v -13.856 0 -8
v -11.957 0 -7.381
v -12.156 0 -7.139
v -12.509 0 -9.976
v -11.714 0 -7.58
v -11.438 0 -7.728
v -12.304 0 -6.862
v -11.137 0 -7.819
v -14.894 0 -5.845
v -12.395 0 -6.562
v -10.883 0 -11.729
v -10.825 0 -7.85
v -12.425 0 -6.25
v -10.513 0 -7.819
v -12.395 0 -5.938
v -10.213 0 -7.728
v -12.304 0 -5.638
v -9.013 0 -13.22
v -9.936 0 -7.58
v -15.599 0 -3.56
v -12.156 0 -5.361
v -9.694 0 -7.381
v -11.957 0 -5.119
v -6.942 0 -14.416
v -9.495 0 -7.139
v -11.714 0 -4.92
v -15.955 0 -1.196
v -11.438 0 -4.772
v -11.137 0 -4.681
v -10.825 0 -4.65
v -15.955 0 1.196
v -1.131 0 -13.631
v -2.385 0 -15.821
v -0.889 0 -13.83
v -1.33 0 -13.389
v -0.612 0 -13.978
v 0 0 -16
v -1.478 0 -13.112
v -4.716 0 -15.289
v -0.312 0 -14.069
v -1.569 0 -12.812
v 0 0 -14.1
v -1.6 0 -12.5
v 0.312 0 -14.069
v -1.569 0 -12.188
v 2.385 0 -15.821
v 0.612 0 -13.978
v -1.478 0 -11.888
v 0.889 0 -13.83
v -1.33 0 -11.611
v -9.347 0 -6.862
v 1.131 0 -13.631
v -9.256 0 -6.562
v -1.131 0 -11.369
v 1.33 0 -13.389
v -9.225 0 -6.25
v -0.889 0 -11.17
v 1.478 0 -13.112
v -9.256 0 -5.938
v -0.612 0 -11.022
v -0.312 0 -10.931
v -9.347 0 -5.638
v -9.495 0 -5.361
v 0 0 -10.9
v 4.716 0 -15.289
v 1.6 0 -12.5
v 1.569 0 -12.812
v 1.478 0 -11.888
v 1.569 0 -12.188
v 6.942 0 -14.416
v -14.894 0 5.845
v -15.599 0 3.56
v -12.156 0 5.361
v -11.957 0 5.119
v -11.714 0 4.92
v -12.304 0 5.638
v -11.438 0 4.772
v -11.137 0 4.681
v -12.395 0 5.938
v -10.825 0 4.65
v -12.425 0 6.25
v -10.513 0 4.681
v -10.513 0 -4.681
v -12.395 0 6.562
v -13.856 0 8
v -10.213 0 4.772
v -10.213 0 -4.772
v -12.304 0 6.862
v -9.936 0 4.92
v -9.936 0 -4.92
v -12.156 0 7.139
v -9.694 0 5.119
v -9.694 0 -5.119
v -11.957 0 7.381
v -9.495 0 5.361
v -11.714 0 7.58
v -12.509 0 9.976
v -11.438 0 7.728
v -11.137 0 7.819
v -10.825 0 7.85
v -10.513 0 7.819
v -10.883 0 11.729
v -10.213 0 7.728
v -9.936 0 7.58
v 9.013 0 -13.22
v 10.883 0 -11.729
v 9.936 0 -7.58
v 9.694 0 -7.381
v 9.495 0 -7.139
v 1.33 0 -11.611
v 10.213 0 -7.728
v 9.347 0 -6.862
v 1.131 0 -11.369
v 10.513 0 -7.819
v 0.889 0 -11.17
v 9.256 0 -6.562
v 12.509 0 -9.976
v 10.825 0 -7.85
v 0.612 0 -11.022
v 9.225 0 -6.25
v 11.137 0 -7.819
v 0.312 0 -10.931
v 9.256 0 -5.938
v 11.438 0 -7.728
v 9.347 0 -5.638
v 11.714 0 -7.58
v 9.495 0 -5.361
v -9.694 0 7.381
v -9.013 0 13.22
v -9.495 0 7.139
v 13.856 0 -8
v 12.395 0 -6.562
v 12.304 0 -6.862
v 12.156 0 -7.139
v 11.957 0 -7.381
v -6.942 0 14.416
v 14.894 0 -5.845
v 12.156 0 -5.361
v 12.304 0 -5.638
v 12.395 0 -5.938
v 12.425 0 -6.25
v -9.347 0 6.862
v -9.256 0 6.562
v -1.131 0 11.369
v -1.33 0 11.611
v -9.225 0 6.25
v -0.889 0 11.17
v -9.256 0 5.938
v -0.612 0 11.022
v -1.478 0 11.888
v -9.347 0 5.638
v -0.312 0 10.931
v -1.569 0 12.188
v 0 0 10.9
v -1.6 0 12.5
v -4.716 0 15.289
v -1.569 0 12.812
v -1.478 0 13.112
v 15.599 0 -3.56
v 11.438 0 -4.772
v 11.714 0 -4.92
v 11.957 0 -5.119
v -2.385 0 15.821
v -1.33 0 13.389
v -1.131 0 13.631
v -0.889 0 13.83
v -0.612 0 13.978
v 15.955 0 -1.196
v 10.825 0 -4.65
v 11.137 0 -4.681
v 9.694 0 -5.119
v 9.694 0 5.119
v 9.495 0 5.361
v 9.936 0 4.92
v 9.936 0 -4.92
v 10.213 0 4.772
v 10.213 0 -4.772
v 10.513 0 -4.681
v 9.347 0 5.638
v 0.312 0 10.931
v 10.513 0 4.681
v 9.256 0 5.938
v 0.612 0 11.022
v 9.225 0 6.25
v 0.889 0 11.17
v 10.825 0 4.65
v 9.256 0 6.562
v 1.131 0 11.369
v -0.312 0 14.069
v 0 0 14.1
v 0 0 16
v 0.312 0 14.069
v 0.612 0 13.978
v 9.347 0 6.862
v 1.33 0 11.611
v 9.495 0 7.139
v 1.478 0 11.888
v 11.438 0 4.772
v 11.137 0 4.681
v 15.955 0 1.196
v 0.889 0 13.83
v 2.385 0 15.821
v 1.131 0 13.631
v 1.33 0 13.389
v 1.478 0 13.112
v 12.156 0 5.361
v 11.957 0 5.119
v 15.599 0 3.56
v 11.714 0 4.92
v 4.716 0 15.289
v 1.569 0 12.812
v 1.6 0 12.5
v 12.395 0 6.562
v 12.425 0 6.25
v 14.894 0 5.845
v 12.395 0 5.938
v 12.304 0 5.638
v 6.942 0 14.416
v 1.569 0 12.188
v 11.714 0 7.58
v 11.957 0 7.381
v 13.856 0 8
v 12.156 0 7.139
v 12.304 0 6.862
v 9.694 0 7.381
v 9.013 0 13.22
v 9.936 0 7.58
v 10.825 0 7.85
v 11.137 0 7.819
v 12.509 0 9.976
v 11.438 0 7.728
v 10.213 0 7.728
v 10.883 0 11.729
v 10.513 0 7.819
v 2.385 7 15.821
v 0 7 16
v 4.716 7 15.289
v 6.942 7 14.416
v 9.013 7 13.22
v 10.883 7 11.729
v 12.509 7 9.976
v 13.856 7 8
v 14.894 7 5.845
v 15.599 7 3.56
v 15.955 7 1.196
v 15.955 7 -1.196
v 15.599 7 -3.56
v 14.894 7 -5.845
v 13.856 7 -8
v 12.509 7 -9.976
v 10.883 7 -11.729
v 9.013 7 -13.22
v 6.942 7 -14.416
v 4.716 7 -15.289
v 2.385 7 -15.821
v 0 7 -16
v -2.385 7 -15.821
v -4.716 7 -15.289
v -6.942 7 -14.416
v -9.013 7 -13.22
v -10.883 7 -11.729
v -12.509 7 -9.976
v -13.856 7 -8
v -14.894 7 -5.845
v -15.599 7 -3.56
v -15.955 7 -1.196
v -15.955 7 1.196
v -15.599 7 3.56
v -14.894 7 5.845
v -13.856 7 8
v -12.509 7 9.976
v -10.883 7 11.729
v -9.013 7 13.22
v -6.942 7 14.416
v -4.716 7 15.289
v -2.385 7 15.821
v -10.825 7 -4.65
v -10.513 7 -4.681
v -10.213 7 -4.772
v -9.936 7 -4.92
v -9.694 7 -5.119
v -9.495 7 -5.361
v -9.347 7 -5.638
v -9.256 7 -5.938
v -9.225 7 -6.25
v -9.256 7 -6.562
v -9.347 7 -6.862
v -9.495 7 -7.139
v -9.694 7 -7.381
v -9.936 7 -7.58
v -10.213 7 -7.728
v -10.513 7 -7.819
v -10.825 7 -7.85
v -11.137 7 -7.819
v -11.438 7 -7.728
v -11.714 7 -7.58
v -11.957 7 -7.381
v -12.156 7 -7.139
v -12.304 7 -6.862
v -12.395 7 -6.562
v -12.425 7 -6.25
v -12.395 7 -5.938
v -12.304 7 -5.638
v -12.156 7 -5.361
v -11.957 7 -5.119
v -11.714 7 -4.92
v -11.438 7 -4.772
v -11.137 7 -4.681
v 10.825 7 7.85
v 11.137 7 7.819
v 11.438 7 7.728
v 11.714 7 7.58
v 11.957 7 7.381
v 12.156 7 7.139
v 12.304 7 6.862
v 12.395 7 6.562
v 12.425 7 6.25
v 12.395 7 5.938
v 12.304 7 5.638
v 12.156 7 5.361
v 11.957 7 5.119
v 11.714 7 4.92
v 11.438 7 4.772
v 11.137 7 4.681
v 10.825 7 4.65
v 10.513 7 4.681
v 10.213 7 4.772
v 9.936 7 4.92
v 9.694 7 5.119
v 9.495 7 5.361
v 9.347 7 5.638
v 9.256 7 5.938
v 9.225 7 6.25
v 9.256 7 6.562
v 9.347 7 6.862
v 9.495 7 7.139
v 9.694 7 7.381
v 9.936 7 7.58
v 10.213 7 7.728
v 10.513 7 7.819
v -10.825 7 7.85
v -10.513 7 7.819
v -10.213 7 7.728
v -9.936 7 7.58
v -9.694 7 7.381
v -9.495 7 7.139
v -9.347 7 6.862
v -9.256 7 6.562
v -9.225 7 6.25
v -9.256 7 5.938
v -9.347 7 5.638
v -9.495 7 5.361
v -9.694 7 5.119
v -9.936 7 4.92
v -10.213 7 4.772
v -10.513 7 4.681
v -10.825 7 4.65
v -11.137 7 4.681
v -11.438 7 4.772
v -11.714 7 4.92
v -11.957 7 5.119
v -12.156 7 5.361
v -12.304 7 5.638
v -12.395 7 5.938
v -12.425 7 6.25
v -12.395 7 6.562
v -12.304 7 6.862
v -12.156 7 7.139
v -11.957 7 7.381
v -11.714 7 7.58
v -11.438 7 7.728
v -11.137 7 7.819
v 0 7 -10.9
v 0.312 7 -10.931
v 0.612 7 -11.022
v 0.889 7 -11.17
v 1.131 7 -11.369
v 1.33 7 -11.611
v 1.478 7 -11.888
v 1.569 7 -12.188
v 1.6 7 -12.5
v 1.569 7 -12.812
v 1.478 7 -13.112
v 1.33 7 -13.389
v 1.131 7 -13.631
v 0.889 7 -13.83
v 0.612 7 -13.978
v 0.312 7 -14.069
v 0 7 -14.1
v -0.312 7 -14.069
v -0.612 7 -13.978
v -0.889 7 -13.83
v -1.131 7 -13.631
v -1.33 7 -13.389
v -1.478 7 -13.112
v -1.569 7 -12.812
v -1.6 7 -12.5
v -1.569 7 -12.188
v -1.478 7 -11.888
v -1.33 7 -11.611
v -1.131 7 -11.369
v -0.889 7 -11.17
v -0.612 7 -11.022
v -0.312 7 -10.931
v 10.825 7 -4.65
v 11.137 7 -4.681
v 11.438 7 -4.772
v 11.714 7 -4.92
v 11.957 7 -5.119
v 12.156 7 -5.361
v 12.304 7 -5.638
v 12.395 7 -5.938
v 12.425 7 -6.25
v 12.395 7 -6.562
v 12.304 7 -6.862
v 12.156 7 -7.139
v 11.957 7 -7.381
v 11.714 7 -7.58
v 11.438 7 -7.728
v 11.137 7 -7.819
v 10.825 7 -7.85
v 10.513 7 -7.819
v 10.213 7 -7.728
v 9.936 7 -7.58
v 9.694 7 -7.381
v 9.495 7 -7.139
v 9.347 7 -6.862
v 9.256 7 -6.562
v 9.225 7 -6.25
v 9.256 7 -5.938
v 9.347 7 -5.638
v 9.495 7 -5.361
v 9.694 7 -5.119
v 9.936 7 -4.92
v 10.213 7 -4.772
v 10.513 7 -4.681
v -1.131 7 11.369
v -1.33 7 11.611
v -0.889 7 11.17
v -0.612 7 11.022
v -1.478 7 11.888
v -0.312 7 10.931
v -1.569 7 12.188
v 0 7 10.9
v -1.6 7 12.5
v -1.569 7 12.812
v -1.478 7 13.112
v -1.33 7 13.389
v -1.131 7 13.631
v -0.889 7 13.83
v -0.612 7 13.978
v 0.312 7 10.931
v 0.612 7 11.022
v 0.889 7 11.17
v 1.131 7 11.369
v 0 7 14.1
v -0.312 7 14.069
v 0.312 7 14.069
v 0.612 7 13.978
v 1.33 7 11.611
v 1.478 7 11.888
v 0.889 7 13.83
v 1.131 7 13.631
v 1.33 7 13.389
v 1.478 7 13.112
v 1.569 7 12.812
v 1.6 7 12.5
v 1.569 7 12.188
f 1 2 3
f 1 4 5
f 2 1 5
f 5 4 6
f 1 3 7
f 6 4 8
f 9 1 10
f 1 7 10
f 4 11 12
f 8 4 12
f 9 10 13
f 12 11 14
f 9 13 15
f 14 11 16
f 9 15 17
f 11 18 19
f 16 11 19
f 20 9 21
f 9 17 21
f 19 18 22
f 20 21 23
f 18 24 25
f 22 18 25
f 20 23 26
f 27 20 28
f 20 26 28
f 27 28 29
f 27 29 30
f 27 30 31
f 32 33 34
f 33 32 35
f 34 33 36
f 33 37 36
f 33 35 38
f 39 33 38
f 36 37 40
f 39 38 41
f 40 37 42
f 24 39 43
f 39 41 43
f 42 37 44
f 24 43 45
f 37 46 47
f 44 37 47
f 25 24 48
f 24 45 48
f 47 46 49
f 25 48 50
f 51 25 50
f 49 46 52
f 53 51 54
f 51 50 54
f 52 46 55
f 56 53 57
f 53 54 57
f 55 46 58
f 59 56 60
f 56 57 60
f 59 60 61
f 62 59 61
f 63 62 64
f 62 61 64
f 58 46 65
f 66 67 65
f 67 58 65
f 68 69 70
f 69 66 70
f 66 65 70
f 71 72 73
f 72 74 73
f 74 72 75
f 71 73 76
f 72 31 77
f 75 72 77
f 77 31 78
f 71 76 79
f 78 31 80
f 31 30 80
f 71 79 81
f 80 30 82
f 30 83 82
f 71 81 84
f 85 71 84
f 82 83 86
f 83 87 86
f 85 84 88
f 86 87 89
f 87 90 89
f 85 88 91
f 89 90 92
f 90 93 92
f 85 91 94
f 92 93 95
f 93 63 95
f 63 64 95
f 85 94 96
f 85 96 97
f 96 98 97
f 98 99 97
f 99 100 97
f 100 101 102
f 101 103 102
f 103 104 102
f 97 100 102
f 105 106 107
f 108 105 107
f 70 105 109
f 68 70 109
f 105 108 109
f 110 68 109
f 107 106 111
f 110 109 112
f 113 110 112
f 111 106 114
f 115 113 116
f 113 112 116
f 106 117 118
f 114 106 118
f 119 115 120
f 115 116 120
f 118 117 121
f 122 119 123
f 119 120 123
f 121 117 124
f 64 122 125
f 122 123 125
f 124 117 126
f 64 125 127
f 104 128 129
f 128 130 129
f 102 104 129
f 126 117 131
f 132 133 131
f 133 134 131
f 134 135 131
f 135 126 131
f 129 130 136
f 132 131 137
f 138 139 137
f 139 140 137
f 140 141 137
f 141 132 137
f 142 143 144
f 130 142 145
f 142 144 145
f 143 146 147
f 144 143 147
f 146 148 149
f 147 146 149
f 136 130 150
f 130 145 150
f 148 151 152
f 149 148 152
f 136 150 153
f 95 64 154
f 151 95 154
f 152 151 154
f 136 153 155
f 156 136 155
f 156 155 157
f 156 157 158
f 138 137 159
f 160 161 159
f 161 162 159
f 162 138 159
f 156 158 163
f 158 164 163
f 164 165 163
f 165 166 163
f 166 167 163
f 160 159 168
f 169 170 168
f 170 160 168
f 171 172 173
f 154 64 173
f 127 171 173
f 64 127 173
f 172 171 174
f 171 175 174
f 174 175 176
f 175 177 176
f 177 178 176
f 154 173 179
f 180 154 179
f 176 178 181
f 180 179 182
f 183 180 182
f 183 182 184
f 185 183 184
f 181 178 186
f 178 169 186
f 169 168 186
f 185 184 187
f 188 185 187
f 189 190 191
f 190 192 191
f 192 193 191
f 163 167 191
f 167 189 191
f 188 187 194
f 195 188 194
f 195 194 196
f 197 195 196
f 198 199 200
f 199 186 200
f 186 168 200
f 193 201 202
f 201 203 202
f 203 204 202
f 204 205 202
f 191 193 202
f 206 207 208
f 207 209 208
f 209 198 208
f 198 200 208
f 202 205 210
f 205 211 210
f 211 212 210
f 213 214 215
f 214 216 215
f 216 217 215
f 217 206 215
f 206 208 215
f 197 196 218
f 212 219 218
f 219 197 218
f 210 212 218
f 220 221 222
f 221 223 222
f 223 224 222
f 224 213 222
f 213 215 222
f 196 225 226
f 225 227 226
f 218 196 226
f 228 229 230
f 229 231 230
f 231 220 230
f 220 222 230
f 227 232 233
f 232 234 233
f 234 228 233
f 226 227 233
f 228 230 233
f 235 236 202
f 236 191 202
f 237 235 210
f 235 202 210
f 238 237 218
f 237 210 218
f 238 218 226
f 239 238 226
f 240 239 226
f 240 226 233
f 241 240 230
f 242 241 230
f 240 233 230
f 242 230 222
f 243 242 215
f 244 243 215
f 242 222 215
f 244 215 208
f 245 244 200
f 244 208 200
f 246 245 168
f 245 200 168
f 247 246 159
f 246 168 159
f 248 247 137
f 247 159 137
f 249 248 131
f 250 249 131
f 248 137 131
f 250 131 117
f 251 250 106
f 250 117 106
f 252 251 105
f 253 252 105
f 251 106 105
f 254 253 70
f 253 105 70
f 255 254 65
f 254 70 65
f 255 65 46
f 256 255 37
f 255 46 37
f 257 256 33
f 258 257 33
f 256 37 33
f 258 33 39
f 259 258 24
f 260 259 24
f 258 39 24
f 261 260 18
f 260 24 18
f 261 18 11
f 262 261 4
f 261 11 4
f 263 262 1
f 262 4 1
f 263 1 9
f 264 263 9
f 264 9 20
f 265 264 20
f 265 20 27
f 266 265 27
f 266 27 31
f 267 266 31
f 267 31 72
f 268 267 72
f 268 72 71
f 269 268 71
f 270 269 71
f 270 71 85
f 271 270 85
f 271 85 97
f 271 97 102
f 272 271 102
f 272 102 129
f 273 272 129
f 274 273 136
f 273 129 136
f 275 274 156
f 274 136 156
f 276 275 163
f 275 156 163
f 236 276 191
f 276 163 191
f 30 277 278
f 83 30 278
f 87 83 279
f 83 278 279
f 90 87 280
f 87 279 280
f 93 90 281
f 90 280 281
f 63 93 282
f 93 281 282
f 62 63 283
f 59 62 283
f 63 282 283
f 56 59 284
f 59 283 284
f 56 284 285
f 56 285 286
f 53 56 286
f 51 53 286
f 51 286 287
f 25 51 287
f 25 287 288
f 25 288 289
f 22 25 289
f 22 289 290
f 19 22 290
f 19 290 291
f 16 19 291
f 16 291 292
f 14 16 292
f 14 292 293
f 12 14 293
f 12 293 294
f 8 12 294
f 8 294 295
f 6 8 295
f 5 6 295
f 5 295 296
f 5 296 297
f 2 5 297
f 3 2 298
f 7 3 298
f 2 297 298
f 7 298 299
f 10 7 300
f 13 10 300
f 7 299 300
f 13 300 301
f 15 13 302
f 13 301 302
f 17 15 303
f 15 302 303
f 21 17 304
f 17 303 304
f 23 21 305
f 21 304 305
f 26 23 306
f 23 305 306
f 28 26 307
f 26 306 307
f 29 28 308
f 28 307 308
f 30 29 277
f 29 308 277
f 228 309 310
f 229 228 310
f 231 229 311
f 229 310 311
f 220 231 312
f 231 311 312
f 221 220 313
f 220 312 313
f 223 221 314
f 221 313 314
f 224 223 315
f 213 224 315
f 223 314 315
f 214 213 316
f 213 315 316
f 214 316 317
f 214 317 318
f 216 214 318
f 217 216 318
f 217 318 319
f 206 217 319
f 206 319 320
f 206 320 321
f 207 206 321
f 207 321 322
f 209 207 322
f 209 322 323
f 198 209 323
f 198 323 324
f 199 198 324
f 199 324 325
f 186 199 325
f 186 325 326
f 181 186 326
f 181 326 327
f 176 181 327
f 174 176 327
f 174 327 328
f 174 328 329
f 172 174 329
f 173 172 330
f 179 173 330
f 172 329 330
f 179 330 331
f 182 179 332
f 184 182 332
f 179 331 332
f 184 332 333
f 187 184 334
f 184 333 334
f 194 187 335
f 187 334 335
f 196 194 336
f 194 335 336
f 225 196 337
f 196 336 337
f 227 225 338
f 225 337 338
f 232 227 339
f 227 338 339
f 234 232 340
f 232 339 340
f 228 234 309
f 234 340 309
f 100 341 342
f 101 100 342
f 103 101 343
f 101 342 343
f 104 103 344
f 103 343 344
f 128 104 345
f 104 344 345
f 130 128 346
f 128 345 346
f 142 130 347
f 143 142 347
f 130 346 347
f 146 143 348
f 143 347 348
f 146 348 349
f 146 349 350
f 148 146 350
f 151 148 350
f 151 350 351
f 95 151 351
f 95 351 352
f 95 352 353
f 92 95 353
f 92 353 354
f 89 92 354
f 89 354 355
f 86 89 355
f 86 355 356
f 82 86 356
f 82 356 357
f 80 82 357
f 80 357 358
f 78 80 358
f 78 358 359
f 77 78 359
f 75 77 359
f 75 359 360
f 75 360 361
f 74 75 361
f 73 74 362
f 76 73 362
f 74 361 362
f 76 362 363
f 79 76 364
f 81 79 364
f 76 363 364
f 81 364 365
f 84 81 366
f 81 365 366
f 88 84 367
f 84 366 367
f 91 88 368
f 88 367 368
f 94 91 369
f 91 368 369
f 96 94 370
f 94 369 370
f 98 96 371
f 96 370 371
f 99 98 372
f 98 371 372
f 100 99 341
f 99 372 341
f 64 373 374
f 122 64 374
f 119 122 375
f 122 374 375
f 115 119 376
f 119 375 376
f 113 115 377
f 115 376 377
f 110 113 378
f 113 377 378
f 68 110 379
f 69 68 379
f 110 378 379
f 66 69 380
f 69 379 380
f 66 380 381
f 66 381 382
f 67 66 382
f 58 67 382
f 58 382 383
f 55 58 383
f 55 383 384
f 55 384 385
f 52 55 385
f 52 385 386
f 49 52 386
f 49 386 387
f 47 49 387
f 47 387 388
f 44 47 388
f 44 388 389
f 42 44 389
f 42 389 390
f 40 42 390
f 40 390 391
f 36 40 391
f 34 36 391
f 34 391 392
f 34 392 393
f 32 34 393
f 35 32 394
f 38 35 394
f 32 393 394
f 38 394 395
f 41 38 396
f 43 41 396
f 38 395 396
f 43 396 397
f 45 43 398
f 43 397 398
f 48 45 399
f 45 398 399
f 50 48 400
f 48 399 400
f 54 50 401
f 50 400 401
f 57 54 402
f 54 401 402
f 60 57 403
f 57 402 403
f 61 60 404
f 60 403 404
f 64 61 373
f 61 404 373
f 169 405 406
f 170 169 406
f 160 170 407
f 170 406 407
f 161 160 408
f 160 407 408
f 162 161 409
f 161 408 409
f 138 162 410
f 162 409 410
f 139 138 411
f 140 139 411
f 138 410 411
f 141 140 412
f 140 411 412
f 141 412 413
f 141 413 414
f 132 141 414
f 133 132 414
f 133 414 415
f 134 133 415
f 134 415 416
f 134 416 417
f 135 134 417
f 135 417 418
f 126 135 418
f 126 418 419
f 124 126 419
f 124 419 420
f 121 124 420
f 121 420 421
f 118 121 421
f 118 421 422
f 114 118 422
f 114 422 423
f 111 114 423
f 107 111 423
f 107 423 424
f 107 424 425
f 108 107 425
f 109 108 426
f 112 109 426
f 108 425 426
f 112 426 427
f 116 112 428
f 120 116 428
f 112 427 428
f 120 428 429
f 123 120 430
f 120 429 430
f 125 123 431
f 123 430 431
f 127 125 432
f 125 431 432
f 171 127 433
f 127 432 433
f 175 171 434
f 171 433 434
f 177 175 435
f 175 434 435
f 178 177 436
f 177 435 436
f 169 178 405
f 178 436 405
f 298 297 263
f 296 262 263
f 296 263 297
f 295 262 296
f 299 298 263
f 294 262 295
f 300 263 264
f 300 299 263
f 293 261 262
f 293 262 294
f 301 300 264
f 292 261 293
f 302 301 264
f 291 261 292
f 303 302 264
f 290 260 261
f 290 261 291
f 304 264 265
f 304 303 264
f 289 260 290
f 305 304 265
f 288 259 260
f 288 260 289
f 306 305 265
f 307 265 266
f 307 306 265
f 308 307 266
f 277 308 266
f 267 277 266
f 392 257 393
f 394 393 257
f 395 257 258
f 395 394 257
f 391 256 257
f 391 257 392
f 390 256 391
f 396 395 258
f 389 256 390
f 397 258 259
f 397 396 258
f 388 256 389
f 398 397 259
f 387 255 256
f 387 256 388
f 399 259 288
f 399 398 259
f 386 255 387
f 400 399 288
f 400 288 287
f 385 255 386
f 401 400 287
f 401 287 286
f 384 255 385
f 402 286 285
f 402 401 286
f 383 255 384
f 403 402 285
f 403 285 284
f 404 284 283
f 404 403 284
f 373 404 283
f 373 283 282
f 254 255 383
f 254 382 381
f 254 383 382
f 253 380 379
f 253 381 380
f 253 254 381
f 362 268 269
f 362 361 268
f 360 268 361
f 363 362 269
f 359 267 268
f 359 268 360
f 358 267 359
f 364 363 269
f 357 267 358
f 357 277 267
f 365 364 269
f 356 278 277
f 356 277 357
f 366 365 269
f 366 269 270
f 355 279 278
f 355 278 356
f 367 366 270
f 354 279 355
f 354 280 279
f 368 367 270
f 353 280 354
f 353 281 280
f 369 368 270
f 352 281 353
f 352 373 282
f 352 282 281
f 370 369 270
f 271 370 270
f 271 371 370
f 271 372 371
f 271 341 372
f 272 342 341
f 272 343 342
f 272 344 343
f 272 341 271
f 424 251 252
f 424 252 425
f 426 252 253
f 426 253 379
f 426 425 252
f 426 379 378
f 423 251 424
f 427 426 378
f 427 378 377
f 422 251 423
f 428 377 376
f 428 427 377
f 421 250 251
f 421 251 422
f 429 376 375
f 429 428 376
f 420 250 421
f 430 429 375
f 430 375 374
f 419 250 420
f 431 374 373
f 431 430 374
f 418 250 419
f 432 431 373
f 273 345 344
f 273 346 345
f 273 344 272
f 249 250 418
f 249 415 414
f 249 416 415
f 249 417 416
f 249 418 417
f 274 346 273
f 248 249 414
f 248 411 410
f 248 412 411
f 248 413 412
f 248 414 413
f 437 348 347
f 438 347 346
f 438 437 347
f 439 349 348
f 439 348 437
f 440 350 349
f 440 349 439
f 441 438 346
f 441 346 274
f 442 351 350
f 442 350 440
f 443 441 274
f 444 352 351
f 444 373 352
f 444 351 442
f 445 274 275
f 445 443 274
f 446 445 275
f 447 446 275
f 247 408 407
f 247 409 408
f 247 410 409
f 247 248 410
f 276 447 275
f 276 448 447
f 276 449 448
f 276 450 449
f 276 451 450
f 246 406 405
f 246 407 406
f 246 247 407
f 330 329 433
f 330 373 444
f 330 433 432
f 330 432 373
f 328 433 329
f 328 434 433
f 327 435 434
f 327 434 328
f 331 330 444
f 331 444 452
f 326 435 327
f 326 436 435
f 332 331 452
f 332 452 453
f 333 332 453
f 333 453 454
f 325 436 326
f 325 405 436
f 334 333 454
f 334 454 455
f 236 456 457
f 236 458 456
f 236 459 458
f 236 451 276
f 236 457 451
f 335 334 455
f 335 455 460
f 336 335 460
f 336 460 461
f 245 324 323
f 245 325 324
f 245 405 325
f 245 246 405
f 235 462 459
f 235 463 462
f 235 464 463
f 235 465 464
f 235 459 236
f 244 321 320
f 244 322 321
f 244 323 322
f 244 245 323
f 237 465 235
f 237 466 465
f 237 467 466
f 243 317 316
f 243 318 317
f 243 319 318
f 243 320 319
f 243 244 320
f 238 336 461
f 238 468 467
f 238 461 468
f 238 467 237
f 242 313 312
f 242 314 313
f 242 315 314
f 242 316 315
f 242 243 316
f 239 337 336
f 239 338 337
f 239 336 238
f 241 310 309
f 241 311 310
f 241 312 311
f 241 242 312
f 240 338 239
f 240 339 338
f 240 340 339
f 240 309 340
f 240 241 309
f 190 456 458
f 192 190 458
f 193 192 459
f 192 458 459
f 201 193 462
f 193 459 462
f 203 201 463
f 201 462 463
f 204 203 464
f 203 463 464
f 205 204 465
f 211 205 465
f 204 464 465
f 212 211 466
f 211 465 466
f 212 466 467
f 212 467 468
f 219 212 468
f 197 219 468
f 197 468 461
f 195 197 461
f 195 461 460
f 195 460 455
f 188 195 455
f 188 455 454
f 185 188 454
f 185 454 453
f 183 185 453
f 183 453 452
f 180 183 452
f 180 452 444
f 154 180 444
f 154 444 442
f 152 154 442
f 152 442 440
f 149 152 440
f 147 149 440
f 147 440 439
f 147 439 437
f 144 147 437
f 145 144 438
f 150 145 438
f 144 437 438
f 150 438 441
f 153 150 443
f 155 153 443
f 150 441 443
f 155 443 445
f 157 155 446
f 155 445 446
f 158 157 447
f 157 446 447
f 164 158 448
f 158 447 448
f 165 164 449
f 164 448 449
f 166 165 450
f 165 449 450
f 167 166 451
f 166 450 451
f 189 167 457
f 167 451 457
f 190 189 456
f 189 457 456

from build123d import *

# Parameters (mm, degrees)
SKETCH_1_R          = 16
EXTRUDE_1_DEPTH     = 5
SKETCH_2_R          = 16
EXTRUDE_2_DEPTH     = 2
SKETCH_3_R          = 1.6
CUT_EXTRUDE_1_DEPTH = 24.685438565


with BuildPart() as part:
    # 草图1 → 凸台-拉伸1 (new body)
    with BuildSketch(Plane(origin=(0, 0, 0), x_dir=(1, 0, 0), z_dir=(0, 1, 0))):
        with Locations(Location((0, 0, 0), (0, 0, 270))):
            Circle(SKETCH_1_R)
    extrude(amount=EXTRUDE_1_DEPTH)

    # 草图2 → 凸台-拉伸2 (add)
    with BuildSketch(Plane(origin=(0, 5, 0), x_dir=(1, 0, 0), z_dir=(0, 1, 0))):
        with Locations(Location((0, 0, 0), (0, 0, 270))):
            Circle(SKETCH_2_R)
    extrude(amount=EXTRUDE_2_DEPTH)

    # 草图3 → 切除-拉伸1 (cut, through all)
    with BuildSketch(Plane(origin=(0, 7, 0), x_dir=(1, 0, 0), z_dir=(0, 1, 0))):
        with Locations(Location((0, 12.5, 0), (0, 0, 270))):
            Circle(SKETCH_3_R)
        with Locations(Location((10.825317547, 6.25, 0), (0, 0, 270))):
            Circle(SKETCH_3_R)
        with Locations(Location((10.825317547, -6.25, 0), (0, 0, 270))):
            Circle(SKETCH_3_R)
        with Locations(Location((0, -12.5, 0), (0, 0, 270))):
            Circle(SKETCH_3_R)
        with Locations(Location((-10.825317547, -6.25, 0), (0, 0, 270))):
            Circle(SKETCH_3_R)
        with Locations(Location((-10.825317547, 6.25, 0), (0, 0, 270))):
            Circle(SKETCH_3_R)
    extrude(amount=-CUT_EXTRUDE_1_DEPTH, mode=Mode.SUBTRACT)


solid = part.part
